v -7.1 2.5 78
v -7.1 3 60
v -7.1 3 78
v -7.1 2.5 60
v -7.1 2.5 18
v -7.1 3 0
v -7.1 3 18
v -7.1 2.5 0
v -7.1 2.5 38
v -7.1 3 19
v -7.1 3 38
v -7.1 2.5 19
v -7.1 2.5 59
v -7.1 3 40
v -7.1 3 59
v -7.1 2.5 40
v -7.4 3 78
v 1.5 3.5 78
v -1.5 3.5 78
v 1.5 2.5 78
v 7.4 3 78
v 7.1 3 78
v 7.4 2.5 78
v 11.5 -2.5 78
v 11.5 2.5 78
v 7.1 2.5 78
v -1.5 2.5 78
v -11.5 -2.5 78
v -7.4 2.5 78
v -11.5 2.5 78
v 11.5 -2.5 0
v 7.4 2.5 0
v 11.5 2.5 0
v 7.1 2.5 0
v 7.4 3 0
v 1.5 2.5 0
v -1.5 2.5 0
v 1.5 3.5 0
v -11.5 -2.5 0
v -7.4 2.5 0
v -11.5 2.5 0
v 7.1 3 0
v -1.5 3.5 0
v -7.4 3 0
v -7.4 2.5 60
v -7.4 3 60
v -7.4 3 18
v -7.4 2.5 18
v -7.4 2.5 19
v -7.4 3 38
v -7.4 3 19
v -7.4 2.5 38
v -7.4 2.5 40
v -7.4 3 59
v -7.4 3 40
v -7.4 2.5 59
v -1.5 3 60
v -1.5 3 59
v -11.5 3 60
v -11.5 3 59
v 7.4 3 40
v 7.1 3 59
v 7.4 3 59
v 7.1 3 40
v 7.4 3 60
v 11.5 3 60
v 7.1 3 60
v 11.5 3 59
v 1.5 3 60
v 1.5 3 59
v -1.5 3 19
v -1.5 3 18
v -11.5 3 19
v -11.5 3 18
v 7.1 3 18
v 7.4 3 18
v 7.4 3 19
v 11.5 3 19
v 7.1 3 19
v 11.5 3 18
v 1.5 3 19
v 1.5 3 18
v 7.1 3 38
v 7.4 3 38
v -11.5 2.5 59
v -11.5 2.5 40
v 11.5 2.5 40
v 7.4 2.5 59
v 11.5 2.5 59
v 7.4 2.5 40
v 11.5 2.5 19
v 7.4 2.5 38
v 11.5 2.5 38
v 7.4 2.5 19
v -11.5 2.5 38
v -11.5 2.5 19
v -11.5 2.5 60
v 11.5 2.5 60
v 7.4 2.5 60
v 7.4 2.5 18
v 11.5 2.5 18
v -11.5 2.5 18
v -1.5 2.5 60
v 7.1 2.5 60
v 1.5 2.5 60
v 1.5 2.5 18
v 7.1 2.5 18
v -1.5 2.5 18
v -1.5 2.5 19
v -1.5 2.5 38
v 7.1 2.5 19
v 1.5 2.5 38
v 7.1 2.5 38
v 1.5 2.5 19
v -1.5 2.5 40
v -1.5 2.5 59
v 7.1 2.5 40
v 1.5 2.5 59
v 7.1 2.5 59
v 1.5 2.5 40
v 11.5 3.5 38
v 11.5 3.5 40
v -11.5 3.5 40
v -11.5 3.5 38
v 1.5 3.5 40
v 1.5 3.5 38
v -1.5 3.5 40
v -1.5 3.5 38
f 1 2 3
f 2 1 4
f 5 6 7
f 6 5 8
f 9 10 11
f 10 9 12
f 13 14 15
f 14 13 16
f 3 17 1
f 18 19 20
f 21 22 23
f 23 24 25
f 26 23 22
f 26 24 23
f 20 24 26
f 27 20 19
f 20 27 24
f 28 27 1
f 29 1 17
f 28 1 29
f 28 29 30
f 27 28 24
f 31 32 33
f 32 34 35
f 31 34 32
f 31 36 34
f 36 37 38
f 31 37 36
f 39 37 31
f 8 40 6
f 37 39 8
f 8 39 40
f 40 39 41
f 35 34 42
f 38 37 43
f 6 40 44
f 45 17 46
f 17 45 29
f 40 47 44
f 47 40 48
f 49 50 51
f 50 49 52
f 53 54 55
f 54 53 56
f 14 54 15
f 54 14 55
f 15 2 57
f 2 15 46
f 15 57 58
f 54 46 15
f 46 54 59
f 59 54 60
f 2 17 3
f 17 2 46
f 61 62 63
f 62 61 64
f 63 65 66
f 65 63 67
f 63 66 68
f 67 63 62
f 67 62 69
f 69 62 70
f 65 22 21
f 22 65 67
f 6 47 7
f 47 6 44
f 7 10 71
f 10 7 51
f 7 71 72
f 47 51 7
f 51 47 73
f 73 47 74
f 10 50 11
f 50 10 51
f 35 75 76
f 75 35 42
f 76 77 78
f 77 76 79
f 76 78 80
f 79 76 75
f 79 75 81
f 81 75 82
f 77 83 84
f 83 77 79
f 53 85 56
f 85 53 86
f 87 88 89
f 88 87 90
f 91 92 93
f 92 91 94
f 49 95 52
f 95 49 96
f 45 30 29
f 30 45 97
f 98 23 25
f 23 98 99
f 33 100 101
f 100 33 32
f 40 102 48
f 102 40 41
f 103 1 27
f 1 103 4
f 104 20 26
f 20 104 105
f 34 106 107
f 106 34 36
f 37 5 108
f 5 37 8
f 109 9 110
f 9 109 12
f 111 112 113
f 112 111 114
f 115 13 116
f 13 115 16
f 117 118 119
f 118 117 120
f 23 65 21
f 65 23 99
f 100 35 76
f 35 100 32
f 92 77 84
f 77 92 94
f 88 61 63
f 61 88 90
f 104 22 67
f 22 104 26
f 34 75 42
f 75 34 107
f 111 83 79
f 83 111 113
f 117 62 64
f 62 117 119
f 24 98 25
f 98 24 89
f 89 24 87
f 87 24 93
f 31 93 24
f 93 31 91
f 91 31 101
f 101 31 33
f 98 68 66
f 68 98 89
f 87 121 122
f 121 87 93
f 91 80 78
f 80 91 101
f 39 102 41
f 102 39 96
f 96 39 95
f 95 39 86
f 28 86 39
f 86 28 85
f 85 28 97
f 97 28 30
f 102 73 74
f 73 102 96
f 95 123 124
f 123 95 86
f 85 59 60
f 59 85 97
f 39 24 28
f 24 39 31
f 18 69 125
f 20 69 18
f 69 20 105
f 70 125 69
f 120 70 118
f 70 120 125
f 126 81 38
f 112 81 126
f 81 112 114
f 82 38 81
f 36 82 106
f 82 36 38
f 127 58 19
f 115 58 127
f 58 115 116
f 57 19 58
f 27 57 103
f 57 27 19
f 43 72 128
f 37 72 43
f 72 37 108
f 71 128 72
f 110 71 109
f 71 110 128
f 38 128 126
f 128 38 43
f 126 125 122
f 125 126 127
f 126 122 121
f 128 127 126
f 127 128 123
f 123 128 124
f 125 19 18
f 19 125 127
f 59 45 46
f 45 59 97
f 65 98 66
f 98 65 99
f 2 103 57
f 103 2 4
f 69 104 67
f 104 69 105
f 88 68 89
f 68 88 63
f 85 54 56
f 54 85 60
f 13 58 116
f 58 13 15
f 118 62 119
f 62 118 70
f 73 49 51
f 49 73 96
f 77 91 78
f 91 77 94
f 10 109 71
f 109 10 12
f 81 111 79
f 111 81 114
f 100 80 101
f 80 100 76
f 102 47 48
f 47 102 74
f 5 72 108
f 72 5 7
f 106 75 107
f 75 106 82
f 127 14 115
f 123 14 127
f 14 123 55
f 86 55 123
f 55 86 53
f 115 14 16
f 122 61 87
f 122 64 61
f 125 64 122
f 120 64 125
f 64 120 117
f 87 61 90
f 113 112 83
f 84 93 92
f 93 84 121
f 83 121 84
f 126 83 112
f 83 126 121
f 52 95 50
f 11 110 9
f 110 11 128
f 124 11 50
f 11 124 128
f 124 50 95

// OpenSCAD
windowWidth = 23;
windowDepth = 5;
windowMiddleBarWidth = 3;
windowMiddleBarProtrusion = 1;
windowSecondaryBarWidth = 0.3;
windowSecondaryBarProtrusion = 0.5;

window01Gap = 9;
window1Height = 35;
window12Gap = 25;
window2Height = 78;
window23Gap = 31;
window3Height = 38;
window34Gap = 16;
window4Height = 13;

verticalSmallBarHeight = 1; 
verticalSmallBarProtrusion = 0.5;
verticalThickBarHeight = 2;
verticalThickBarProtrusion = 1;


window2();

module window2() {
    translate([0,0,window2Height/2]) {
        window(window2Height);
        verticalBar(verticalThickBarHeight, verticalThickBarProtrusion);
        for(i = [1, -1]) {
            translate([0,0,(window2Height+verticalThickBarHeight*2)/4*i]) {
                verticalBar(verticalSmallBarHeight, verticalSmallBarProtrusion);
            }
        }
    }
}

module window1() {
    translate([0,0,window1Height/2]) {
        window(window1Height);
        verticalBar(verticalSmallBarHeight, verticalSmallBarProtrusion);
    }
}

module verticalBar(height, depth) {
    translate([0,(windowDepth+depth)/2, 0]) cube([windowWidth, depth, height], center = true);
}

module window(height) {
    cube([windowWidth, windowDepth, height], center = true);
    windowMiddleBar(height);
    windowSecondaryBars(height);
   
}

module windowMiddleBar(height) {
    translate([0,(windowDepth+windowMiddleBarProtrusion)/2, 0]) {
         cube([windowMiddleBarWidth, windowMiddleBarProtrusion, height], center = true);
    }
}

module windowSecondaryBars(height) {
    for(i = [-1, 1]) {
        translate([(windowWidth+windowMiddleBarWidth*2)/4*i, (windowDepth+windowSecondaryBarProtrusion)/2, 0]) {
            windowSecondaryBar(height);
        }
    }
}

module windowSecondaryBar(height) {
    cube([windowSecondaryBarWidth, windowSecondaryBarProtrusion, height], center = true);
    
}
